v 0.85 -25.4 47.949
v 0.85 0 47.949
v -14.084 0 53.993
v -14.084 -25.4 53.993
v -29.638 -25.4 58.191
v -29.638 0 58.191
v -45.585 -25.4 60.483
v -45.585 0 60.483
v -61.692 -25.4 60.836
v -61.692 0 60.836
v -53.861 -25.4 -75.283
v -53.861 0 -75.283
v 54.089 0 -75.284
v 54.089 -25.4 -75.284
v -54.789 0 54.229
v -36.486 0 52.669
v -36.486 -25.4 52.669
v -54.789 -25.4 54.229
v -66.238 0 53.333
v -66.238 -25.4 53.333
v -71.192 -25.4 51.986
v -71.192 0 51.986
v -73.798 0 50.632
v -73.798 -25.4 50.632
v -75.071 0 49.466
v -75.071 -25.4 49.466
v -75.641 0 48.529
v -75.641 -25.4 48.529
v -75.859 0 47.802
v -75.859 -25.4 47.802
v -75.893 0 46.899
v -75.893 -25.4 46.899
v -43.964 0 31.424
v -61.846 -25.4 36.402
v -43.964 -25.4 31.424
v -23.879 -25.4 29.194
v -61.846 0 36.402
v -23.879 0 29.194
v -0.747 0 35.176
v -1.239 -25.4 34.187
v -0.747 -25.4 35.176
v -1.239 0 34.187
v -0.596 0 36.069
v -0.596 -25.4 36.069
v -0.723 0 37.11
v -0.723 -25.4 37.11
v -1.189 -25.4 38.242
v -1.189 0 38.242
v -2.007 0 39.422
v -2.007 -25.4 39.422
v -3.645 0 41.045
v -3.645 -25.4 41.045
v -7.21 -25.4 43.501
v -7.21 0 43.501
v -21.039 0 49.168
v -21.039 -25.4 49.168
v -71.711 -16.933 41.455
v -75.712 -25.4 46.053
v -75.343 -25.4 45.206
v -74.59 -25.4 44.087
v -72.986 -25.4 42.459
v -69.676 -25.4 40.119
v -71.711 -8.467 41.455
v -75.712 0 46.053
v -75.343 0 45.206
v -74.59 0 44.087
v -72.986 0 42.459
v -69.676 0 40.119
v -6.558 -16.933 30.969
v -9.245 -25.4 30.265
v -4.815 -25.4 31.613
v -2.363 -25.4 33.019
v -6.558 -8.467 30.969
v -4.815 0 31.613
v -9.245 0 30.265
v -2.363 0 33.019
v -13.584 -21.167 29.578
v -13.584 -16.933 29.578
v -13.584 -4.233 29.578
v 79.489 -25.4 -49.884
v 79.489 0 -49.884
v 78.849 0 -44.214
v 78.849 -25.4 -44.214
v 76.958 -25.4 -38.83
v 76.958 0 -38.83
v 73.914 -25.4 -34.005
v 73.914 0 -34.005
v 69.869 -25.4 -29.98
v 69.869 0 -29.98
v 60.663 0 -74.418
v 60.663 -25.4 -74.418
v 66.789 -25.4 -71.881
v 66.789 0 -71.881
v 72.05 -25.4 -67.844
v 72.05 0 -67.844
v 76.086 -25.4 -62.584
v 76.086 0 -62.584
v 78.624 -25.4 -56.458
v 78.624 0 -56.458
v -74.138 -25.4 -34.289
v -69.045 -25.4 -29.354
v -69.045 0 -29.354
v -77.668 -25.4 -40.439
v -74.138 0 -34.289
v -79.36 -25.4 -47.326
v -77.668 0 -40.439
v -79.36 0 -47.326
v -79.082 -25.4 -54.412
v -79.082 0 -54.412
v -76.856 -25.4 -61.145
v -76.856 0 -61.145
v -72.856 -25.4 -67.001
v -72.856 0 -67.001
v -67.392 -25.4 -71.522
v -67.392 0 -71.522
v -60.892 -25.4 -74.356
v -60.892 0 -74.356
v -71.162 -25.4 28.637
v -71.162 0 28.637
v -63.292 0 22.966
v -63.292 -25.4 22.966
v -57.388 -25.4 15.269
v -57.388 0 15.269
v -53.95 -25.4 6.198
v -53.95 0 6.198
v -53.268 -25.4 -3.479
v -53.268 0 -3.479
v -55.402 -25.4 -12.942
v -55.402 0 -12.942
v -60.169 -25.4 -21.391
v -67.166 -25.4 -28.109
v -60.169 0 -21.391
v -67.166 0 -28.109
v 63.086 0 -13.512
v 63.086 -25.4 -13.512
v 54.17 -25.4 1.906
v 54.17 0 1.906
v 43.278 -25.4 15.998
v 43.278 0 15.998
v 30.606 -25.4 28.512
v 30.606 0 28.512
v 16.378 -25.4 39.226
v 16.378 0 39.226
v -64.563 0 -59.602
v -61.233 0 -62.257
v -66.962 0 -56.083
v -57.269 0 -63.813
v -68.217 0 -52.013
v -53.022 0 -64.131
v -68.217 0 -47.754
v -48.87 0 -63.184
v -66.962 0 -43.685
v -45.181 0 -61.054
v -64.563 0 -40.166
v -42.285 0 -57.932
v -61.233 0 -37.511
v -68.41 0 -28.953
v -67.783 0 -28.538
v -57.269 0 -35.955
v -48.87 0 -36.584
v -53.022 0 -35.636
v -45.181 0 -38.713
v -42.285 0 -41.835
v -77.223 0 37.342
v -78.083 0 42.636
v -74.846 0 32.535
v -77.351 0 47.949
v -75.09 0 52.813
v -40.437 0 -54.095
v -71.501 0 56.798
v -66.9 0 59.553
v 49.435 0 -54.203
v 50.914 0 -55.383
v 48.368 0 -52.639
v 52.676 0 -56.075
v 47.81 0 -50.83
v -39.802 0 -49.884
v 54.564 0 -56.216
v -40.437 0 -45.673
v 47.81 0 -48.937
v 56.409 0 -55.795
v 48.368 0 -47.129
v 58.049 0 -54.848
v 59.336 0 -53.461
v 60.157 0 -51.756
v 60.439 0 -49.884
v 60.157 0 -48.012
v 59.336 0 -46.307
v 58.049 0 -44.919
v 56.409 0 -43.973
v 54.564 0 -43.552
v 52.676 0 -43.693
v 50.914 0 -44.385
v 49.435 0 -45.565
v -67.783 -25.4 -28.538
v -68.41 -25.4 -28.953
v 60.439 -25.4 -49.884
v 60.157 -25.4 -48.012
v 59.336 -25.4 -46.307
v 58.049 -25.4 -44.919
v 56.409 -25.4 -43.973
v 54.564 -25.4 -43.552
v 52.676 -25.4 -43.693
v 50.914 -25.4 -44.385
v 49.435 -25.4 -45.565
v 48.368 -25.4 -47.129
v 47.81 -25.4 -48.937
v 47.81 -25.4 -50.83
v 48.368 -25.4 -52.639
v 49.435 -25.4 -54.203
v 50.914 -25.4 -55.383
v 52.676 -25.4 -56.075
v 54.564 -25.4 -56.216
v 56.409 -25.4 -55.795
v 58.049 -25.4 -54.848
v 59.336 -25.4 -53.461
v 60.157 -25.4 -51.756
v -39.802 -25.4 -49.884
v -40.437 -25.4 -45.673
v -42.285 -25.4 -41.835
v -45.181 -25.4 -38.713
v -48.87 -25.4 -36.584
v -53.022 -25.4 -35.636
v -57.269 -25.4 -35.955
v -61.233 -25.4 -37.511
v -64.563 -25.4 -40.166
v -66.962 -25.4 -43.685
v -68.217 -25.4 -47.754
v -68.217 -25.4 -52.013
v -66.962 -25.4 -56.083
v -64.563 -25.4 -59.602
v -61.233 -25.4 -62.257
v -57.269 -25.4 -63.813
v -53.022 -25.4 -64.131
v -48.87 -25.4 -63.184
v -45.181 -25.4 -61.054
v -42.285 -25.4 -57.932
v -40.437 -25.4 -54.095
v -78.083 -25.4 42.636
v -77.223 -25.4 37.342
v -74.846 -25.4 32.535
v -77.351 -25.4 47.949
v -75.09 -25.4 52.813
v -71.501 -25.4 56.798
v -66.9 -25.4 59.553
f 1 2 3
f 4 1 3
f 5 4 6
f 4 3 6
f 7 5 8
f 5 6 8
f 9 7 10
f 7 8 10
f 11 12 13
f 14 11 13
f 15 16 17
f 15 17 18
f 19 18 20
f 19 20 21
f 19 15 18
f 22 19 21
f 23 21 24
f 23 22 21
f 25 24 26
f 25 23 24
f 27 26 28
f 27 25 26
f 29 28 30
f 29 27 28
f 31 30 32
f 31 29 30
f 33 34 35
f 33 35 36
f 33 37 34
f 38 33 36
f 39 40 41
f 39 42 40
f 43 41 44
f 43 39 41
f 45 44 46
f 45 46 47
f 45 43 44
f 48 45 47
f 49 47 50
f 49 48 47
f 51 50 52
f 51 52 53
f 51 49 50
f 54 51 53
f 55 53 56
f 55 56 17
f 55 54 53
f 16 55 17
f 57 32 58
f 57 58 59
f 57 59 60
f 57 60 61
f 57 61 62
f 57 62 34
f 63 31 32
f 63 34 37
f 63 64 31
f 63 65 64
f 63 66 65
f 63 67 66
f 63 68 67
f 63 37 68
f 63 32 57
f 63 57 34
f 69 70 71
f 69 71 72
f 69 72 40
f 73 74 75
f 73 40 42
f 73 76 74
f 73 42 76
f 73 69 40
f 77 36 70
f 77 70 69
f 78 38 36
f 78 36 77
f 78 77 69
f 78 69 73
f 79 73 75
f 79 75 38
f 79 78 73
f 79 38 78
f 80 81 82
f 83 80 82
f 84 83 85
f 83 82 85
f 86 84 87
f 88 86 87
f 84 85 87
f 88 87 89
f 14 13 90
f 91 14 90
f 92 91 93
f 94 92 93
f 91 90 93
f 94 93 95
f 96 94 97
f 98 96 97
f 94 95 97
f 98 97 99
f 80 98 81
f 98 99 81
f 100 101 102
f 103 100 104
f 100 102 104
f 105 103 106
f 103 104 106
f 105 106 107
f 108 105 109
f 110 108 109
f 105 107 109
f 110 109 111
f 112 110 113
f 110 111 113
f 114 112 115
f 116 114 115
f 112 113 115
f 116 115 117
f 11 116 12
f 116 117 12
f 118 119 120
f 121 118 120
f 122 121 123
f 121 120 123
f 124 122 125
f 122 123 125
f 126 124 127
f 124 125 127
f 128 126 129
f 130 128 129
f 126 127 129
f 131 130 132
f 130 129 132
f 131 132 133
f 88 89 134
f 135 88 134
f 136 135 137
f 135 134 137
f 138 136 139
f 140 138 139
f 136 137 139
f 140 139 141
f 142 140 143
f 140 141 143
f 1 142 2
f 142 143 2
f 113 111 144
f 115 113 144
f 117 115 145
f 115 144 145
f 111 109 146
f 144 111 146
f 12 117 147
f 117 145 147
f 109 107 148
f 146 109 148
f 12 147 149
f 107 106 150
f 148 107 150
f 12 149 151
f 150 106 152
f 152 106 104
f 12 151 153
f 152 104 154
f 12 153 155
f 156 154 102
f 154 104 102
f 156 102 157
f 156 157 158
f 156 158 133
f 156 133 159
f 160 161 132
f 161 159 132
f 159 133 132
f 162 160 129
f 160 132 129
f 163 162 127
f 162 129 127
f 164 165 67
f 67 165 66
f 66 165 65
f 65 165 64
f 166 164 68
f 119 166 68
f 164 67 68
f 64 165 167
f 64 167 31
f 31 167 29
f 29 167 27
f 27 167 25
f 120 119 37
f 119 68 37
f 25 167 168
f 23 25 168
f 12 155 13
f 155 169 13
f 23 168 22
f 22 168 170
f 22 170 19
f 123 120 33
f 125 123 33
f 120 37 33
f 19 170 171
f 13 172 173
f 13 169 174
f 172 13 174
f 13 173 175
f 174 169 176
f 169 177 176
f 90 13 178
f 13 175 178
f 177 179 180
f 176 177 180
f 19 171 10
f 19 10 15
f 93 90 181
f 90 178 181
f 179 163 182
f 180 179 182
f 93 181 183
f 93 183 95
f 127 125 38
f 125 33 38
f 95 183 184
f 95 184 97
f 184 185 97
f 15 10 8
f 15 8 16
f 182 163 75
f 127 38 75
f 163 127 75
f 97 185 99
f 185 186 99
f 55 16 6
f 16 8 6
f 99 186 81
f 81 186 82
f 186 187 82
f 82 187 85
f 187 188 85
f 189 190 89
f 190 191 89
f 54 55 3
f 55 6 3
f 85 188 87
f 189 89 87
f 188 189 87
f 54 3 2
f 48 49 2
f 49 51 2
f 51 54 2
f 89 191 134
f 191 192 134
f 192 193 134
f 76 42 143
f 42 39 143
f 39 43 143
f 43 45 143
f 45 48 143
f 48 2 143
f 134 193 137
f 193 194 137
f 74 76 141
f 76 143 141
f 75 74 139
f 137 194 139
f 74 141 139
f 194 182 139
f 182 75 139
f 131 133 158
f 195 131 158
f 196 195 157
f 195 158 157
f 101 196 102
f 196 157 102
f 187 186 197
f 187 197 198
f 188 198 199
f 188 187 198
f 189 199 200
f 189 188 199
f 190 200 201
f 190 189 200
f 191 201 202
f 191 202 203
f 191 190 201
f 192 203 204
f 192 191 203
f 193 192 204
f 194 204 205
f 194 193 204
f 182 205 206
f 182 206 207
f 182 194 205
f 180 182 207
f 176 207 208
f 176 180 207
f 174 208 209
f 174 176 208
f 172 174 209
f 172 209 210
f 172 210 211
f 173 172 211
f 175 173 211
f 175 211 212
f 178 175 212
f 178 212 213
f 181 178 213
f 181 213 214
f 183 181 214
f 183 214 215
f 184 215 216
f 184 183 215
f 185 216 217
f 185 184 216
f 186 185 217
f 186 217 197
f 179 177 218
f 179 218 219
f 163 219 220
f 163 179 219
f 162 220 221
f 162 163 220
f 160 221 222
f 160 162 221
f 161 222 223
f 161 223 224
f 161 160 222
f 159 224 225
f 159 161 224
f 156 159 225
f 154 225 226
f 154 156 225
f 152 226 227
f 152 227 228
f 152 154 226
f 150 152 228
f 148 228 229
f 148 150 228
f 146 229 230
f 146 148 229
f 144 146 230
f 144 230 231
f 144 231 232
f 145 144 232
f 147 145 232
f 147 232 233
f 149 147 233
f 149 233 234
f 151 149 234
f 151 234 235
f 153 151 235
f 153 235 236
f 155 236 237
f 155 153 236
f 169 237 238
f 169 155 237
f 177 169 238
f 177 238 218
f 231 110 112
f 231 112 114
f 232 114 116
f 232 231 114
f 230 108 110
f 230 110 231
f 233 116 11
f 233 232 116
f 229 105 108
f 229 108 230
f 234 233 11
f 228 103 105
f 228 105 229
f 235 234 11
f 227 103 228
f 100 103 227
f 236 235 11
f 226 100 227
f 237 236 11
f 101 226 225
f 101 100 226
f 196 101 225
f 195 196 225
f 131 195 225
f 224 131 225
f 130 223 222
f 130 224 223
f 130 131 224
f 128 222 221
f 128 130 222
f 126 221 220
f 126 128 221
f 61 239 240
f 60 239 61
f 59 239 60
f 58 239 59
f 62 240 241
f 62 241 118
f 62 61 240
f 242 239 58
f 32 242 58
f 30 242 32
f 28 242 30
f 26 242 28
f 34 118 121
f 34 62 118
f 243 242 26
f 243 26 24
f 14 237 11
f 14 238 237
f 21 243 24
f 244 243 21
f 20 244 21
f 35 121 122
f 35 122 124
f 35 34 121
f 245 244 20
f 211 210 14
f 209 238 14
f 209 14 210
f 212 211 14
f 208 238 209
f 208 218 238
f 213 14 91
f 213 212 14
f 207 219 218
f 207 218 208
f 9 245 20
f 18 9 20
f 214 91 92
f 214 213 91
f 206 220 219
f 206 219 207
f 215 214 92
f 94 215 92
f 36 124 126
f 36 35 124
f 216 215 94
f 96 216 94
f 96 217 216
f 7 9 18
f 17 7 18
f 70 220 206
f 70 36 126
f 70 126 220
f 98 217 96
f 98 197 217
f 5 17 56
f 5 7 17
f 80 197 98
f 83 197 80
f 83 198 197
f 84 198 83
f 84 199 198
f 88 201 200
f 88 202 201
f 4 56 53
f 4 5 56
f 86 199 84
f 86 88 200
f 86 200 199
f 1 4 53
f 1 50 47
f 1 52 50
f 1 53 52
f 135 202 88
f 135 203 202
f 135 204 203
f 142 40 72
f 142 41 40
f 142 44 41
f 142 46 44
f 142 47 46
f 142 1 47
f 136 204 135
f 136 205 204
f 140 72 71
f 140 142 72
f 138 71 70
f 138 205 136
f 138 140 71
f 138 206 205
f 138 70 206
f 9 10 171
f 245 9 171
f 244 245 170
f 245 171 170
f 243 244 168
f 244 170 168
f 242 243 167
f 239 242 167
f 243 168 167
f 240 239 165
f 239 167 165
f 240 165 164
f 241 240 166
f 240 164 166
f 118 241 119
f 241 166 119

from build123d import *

# Parameters (mm, degrees)
F0_R     = 14.2875
F0_R_2   = 6.35
F1_DEPTH = 25.4


with BuildPart() as f1:
    # F0 (on Front) → F1 (new body)
    with BuildSketch(Plane.XZ):
        with BuildLine():
            ThreePointArc((-61.691961, 60.835692), (-77.350545, 47.949147), (-71.162157, 28.637022))
            ThreePointArc((-71.162157, 28.637022), (-42.423401, 27.949077), (-15.744486, 17.242779))
            ThreePointArc((-15.744486, 17.242779), (1.707415, 27.648546), (0.850393, 47.949147))
            ThreePointArc((0.850393, 47.949147), (-29.638042, 58.191307), (-61.691961, 60.835692))
        make_face()
        with BuildLine():
            add(Edge.make_bspline(
                [(-36.485725, 52.66885), (-101.638302, 63.155588), (-71.710867, 41.455281), (-41.783431, 19.754974), (-6.55829, 30.968543), (28.666852, 42.182112), (-36.485725, 52.66885)],
                knots=[4.712389, 4.712389, 4.712389, 6.806784, 6.806784, 8.901179, 8.901179, 10.995574, 10.995574, 10.995574], degree=2, weights=[1, 0.5, 1, 0.5, 1, 0.5, 1]))
        make_face(mode=Mode.SUBTRACT)
        with BuildLine():
            ThreePointArc((-28.689433, -49.883855), (-36.048271, -67.763354), (-53.860809, -75.282826))
            Line((-53.860809, -75.282826), (54.089191, -75.283855))
            ThreePointArc((54.089191, -75.283855), (30.102829, -41.529045), (69.869048, -29.979993))
            ThreePointArc((69.869048, -29.979993), (43.278115, 15.997576), (0.850393, 47.949147))
            ThreePointArc((0.850393, 47.949147), (1.707415, 27.648546), (-15.744486, 17.242779))
            ThreePointArc((-15.744486, 17.242779), (-42.423401, 27.949077), (-71.162157, 28.637022))
            ThreePointArc((-71.162157, 28.637022), (-53.255114, 1.384315), (-67.166468, -28.108843))
            ThreePointArc((-67.166468, -28.108843), (-41.579371, -27.778237), (-28.689433, -49.883855))
        make_face()
        with BuildLine():
            ThreePointArc((-67.166468, -28.108843), (-68.095439, -28.74728), (-69.045462, -29.353946))
            ThreePointArc((-69.045462, -29.353946), (-78.205602, -57.856958), (-53.860809, -75.282826))
            ThreePointArc((-53.860809, -75.282826), (-36.048271, -67.763354), (-28.689433, -49.883855))
            ThreePointArc((-28.689433, -49.883855), (-41.579371, -27.778237), (-67.166468, -28.108843))
        make_face()
        with Locations((-54.089433, -49.883855)):
            Circle(F0_R, mode=Mode.SUBTRACT)
        with BuildLine():
            ThreePointArc((69.869048, -29.979993), (30.102829, -41.529045), (54.089191, -75.283855))
            ThreePointArc((54.089191, -75.283855), (72.049859, -67.844453), (79.489433, -49.883855))
            ThreePointArc((79.489433, -49.883855), (76.958213, -38.830399), (69.869048, -29.979993))
        make_face()
        with Locations((54.089433, -49.883855)):
            Circle(F0_R_2, mode=Mode.SUBTRACT)
    extrude(amount=F1_DEPTH)


solid = f1.part
